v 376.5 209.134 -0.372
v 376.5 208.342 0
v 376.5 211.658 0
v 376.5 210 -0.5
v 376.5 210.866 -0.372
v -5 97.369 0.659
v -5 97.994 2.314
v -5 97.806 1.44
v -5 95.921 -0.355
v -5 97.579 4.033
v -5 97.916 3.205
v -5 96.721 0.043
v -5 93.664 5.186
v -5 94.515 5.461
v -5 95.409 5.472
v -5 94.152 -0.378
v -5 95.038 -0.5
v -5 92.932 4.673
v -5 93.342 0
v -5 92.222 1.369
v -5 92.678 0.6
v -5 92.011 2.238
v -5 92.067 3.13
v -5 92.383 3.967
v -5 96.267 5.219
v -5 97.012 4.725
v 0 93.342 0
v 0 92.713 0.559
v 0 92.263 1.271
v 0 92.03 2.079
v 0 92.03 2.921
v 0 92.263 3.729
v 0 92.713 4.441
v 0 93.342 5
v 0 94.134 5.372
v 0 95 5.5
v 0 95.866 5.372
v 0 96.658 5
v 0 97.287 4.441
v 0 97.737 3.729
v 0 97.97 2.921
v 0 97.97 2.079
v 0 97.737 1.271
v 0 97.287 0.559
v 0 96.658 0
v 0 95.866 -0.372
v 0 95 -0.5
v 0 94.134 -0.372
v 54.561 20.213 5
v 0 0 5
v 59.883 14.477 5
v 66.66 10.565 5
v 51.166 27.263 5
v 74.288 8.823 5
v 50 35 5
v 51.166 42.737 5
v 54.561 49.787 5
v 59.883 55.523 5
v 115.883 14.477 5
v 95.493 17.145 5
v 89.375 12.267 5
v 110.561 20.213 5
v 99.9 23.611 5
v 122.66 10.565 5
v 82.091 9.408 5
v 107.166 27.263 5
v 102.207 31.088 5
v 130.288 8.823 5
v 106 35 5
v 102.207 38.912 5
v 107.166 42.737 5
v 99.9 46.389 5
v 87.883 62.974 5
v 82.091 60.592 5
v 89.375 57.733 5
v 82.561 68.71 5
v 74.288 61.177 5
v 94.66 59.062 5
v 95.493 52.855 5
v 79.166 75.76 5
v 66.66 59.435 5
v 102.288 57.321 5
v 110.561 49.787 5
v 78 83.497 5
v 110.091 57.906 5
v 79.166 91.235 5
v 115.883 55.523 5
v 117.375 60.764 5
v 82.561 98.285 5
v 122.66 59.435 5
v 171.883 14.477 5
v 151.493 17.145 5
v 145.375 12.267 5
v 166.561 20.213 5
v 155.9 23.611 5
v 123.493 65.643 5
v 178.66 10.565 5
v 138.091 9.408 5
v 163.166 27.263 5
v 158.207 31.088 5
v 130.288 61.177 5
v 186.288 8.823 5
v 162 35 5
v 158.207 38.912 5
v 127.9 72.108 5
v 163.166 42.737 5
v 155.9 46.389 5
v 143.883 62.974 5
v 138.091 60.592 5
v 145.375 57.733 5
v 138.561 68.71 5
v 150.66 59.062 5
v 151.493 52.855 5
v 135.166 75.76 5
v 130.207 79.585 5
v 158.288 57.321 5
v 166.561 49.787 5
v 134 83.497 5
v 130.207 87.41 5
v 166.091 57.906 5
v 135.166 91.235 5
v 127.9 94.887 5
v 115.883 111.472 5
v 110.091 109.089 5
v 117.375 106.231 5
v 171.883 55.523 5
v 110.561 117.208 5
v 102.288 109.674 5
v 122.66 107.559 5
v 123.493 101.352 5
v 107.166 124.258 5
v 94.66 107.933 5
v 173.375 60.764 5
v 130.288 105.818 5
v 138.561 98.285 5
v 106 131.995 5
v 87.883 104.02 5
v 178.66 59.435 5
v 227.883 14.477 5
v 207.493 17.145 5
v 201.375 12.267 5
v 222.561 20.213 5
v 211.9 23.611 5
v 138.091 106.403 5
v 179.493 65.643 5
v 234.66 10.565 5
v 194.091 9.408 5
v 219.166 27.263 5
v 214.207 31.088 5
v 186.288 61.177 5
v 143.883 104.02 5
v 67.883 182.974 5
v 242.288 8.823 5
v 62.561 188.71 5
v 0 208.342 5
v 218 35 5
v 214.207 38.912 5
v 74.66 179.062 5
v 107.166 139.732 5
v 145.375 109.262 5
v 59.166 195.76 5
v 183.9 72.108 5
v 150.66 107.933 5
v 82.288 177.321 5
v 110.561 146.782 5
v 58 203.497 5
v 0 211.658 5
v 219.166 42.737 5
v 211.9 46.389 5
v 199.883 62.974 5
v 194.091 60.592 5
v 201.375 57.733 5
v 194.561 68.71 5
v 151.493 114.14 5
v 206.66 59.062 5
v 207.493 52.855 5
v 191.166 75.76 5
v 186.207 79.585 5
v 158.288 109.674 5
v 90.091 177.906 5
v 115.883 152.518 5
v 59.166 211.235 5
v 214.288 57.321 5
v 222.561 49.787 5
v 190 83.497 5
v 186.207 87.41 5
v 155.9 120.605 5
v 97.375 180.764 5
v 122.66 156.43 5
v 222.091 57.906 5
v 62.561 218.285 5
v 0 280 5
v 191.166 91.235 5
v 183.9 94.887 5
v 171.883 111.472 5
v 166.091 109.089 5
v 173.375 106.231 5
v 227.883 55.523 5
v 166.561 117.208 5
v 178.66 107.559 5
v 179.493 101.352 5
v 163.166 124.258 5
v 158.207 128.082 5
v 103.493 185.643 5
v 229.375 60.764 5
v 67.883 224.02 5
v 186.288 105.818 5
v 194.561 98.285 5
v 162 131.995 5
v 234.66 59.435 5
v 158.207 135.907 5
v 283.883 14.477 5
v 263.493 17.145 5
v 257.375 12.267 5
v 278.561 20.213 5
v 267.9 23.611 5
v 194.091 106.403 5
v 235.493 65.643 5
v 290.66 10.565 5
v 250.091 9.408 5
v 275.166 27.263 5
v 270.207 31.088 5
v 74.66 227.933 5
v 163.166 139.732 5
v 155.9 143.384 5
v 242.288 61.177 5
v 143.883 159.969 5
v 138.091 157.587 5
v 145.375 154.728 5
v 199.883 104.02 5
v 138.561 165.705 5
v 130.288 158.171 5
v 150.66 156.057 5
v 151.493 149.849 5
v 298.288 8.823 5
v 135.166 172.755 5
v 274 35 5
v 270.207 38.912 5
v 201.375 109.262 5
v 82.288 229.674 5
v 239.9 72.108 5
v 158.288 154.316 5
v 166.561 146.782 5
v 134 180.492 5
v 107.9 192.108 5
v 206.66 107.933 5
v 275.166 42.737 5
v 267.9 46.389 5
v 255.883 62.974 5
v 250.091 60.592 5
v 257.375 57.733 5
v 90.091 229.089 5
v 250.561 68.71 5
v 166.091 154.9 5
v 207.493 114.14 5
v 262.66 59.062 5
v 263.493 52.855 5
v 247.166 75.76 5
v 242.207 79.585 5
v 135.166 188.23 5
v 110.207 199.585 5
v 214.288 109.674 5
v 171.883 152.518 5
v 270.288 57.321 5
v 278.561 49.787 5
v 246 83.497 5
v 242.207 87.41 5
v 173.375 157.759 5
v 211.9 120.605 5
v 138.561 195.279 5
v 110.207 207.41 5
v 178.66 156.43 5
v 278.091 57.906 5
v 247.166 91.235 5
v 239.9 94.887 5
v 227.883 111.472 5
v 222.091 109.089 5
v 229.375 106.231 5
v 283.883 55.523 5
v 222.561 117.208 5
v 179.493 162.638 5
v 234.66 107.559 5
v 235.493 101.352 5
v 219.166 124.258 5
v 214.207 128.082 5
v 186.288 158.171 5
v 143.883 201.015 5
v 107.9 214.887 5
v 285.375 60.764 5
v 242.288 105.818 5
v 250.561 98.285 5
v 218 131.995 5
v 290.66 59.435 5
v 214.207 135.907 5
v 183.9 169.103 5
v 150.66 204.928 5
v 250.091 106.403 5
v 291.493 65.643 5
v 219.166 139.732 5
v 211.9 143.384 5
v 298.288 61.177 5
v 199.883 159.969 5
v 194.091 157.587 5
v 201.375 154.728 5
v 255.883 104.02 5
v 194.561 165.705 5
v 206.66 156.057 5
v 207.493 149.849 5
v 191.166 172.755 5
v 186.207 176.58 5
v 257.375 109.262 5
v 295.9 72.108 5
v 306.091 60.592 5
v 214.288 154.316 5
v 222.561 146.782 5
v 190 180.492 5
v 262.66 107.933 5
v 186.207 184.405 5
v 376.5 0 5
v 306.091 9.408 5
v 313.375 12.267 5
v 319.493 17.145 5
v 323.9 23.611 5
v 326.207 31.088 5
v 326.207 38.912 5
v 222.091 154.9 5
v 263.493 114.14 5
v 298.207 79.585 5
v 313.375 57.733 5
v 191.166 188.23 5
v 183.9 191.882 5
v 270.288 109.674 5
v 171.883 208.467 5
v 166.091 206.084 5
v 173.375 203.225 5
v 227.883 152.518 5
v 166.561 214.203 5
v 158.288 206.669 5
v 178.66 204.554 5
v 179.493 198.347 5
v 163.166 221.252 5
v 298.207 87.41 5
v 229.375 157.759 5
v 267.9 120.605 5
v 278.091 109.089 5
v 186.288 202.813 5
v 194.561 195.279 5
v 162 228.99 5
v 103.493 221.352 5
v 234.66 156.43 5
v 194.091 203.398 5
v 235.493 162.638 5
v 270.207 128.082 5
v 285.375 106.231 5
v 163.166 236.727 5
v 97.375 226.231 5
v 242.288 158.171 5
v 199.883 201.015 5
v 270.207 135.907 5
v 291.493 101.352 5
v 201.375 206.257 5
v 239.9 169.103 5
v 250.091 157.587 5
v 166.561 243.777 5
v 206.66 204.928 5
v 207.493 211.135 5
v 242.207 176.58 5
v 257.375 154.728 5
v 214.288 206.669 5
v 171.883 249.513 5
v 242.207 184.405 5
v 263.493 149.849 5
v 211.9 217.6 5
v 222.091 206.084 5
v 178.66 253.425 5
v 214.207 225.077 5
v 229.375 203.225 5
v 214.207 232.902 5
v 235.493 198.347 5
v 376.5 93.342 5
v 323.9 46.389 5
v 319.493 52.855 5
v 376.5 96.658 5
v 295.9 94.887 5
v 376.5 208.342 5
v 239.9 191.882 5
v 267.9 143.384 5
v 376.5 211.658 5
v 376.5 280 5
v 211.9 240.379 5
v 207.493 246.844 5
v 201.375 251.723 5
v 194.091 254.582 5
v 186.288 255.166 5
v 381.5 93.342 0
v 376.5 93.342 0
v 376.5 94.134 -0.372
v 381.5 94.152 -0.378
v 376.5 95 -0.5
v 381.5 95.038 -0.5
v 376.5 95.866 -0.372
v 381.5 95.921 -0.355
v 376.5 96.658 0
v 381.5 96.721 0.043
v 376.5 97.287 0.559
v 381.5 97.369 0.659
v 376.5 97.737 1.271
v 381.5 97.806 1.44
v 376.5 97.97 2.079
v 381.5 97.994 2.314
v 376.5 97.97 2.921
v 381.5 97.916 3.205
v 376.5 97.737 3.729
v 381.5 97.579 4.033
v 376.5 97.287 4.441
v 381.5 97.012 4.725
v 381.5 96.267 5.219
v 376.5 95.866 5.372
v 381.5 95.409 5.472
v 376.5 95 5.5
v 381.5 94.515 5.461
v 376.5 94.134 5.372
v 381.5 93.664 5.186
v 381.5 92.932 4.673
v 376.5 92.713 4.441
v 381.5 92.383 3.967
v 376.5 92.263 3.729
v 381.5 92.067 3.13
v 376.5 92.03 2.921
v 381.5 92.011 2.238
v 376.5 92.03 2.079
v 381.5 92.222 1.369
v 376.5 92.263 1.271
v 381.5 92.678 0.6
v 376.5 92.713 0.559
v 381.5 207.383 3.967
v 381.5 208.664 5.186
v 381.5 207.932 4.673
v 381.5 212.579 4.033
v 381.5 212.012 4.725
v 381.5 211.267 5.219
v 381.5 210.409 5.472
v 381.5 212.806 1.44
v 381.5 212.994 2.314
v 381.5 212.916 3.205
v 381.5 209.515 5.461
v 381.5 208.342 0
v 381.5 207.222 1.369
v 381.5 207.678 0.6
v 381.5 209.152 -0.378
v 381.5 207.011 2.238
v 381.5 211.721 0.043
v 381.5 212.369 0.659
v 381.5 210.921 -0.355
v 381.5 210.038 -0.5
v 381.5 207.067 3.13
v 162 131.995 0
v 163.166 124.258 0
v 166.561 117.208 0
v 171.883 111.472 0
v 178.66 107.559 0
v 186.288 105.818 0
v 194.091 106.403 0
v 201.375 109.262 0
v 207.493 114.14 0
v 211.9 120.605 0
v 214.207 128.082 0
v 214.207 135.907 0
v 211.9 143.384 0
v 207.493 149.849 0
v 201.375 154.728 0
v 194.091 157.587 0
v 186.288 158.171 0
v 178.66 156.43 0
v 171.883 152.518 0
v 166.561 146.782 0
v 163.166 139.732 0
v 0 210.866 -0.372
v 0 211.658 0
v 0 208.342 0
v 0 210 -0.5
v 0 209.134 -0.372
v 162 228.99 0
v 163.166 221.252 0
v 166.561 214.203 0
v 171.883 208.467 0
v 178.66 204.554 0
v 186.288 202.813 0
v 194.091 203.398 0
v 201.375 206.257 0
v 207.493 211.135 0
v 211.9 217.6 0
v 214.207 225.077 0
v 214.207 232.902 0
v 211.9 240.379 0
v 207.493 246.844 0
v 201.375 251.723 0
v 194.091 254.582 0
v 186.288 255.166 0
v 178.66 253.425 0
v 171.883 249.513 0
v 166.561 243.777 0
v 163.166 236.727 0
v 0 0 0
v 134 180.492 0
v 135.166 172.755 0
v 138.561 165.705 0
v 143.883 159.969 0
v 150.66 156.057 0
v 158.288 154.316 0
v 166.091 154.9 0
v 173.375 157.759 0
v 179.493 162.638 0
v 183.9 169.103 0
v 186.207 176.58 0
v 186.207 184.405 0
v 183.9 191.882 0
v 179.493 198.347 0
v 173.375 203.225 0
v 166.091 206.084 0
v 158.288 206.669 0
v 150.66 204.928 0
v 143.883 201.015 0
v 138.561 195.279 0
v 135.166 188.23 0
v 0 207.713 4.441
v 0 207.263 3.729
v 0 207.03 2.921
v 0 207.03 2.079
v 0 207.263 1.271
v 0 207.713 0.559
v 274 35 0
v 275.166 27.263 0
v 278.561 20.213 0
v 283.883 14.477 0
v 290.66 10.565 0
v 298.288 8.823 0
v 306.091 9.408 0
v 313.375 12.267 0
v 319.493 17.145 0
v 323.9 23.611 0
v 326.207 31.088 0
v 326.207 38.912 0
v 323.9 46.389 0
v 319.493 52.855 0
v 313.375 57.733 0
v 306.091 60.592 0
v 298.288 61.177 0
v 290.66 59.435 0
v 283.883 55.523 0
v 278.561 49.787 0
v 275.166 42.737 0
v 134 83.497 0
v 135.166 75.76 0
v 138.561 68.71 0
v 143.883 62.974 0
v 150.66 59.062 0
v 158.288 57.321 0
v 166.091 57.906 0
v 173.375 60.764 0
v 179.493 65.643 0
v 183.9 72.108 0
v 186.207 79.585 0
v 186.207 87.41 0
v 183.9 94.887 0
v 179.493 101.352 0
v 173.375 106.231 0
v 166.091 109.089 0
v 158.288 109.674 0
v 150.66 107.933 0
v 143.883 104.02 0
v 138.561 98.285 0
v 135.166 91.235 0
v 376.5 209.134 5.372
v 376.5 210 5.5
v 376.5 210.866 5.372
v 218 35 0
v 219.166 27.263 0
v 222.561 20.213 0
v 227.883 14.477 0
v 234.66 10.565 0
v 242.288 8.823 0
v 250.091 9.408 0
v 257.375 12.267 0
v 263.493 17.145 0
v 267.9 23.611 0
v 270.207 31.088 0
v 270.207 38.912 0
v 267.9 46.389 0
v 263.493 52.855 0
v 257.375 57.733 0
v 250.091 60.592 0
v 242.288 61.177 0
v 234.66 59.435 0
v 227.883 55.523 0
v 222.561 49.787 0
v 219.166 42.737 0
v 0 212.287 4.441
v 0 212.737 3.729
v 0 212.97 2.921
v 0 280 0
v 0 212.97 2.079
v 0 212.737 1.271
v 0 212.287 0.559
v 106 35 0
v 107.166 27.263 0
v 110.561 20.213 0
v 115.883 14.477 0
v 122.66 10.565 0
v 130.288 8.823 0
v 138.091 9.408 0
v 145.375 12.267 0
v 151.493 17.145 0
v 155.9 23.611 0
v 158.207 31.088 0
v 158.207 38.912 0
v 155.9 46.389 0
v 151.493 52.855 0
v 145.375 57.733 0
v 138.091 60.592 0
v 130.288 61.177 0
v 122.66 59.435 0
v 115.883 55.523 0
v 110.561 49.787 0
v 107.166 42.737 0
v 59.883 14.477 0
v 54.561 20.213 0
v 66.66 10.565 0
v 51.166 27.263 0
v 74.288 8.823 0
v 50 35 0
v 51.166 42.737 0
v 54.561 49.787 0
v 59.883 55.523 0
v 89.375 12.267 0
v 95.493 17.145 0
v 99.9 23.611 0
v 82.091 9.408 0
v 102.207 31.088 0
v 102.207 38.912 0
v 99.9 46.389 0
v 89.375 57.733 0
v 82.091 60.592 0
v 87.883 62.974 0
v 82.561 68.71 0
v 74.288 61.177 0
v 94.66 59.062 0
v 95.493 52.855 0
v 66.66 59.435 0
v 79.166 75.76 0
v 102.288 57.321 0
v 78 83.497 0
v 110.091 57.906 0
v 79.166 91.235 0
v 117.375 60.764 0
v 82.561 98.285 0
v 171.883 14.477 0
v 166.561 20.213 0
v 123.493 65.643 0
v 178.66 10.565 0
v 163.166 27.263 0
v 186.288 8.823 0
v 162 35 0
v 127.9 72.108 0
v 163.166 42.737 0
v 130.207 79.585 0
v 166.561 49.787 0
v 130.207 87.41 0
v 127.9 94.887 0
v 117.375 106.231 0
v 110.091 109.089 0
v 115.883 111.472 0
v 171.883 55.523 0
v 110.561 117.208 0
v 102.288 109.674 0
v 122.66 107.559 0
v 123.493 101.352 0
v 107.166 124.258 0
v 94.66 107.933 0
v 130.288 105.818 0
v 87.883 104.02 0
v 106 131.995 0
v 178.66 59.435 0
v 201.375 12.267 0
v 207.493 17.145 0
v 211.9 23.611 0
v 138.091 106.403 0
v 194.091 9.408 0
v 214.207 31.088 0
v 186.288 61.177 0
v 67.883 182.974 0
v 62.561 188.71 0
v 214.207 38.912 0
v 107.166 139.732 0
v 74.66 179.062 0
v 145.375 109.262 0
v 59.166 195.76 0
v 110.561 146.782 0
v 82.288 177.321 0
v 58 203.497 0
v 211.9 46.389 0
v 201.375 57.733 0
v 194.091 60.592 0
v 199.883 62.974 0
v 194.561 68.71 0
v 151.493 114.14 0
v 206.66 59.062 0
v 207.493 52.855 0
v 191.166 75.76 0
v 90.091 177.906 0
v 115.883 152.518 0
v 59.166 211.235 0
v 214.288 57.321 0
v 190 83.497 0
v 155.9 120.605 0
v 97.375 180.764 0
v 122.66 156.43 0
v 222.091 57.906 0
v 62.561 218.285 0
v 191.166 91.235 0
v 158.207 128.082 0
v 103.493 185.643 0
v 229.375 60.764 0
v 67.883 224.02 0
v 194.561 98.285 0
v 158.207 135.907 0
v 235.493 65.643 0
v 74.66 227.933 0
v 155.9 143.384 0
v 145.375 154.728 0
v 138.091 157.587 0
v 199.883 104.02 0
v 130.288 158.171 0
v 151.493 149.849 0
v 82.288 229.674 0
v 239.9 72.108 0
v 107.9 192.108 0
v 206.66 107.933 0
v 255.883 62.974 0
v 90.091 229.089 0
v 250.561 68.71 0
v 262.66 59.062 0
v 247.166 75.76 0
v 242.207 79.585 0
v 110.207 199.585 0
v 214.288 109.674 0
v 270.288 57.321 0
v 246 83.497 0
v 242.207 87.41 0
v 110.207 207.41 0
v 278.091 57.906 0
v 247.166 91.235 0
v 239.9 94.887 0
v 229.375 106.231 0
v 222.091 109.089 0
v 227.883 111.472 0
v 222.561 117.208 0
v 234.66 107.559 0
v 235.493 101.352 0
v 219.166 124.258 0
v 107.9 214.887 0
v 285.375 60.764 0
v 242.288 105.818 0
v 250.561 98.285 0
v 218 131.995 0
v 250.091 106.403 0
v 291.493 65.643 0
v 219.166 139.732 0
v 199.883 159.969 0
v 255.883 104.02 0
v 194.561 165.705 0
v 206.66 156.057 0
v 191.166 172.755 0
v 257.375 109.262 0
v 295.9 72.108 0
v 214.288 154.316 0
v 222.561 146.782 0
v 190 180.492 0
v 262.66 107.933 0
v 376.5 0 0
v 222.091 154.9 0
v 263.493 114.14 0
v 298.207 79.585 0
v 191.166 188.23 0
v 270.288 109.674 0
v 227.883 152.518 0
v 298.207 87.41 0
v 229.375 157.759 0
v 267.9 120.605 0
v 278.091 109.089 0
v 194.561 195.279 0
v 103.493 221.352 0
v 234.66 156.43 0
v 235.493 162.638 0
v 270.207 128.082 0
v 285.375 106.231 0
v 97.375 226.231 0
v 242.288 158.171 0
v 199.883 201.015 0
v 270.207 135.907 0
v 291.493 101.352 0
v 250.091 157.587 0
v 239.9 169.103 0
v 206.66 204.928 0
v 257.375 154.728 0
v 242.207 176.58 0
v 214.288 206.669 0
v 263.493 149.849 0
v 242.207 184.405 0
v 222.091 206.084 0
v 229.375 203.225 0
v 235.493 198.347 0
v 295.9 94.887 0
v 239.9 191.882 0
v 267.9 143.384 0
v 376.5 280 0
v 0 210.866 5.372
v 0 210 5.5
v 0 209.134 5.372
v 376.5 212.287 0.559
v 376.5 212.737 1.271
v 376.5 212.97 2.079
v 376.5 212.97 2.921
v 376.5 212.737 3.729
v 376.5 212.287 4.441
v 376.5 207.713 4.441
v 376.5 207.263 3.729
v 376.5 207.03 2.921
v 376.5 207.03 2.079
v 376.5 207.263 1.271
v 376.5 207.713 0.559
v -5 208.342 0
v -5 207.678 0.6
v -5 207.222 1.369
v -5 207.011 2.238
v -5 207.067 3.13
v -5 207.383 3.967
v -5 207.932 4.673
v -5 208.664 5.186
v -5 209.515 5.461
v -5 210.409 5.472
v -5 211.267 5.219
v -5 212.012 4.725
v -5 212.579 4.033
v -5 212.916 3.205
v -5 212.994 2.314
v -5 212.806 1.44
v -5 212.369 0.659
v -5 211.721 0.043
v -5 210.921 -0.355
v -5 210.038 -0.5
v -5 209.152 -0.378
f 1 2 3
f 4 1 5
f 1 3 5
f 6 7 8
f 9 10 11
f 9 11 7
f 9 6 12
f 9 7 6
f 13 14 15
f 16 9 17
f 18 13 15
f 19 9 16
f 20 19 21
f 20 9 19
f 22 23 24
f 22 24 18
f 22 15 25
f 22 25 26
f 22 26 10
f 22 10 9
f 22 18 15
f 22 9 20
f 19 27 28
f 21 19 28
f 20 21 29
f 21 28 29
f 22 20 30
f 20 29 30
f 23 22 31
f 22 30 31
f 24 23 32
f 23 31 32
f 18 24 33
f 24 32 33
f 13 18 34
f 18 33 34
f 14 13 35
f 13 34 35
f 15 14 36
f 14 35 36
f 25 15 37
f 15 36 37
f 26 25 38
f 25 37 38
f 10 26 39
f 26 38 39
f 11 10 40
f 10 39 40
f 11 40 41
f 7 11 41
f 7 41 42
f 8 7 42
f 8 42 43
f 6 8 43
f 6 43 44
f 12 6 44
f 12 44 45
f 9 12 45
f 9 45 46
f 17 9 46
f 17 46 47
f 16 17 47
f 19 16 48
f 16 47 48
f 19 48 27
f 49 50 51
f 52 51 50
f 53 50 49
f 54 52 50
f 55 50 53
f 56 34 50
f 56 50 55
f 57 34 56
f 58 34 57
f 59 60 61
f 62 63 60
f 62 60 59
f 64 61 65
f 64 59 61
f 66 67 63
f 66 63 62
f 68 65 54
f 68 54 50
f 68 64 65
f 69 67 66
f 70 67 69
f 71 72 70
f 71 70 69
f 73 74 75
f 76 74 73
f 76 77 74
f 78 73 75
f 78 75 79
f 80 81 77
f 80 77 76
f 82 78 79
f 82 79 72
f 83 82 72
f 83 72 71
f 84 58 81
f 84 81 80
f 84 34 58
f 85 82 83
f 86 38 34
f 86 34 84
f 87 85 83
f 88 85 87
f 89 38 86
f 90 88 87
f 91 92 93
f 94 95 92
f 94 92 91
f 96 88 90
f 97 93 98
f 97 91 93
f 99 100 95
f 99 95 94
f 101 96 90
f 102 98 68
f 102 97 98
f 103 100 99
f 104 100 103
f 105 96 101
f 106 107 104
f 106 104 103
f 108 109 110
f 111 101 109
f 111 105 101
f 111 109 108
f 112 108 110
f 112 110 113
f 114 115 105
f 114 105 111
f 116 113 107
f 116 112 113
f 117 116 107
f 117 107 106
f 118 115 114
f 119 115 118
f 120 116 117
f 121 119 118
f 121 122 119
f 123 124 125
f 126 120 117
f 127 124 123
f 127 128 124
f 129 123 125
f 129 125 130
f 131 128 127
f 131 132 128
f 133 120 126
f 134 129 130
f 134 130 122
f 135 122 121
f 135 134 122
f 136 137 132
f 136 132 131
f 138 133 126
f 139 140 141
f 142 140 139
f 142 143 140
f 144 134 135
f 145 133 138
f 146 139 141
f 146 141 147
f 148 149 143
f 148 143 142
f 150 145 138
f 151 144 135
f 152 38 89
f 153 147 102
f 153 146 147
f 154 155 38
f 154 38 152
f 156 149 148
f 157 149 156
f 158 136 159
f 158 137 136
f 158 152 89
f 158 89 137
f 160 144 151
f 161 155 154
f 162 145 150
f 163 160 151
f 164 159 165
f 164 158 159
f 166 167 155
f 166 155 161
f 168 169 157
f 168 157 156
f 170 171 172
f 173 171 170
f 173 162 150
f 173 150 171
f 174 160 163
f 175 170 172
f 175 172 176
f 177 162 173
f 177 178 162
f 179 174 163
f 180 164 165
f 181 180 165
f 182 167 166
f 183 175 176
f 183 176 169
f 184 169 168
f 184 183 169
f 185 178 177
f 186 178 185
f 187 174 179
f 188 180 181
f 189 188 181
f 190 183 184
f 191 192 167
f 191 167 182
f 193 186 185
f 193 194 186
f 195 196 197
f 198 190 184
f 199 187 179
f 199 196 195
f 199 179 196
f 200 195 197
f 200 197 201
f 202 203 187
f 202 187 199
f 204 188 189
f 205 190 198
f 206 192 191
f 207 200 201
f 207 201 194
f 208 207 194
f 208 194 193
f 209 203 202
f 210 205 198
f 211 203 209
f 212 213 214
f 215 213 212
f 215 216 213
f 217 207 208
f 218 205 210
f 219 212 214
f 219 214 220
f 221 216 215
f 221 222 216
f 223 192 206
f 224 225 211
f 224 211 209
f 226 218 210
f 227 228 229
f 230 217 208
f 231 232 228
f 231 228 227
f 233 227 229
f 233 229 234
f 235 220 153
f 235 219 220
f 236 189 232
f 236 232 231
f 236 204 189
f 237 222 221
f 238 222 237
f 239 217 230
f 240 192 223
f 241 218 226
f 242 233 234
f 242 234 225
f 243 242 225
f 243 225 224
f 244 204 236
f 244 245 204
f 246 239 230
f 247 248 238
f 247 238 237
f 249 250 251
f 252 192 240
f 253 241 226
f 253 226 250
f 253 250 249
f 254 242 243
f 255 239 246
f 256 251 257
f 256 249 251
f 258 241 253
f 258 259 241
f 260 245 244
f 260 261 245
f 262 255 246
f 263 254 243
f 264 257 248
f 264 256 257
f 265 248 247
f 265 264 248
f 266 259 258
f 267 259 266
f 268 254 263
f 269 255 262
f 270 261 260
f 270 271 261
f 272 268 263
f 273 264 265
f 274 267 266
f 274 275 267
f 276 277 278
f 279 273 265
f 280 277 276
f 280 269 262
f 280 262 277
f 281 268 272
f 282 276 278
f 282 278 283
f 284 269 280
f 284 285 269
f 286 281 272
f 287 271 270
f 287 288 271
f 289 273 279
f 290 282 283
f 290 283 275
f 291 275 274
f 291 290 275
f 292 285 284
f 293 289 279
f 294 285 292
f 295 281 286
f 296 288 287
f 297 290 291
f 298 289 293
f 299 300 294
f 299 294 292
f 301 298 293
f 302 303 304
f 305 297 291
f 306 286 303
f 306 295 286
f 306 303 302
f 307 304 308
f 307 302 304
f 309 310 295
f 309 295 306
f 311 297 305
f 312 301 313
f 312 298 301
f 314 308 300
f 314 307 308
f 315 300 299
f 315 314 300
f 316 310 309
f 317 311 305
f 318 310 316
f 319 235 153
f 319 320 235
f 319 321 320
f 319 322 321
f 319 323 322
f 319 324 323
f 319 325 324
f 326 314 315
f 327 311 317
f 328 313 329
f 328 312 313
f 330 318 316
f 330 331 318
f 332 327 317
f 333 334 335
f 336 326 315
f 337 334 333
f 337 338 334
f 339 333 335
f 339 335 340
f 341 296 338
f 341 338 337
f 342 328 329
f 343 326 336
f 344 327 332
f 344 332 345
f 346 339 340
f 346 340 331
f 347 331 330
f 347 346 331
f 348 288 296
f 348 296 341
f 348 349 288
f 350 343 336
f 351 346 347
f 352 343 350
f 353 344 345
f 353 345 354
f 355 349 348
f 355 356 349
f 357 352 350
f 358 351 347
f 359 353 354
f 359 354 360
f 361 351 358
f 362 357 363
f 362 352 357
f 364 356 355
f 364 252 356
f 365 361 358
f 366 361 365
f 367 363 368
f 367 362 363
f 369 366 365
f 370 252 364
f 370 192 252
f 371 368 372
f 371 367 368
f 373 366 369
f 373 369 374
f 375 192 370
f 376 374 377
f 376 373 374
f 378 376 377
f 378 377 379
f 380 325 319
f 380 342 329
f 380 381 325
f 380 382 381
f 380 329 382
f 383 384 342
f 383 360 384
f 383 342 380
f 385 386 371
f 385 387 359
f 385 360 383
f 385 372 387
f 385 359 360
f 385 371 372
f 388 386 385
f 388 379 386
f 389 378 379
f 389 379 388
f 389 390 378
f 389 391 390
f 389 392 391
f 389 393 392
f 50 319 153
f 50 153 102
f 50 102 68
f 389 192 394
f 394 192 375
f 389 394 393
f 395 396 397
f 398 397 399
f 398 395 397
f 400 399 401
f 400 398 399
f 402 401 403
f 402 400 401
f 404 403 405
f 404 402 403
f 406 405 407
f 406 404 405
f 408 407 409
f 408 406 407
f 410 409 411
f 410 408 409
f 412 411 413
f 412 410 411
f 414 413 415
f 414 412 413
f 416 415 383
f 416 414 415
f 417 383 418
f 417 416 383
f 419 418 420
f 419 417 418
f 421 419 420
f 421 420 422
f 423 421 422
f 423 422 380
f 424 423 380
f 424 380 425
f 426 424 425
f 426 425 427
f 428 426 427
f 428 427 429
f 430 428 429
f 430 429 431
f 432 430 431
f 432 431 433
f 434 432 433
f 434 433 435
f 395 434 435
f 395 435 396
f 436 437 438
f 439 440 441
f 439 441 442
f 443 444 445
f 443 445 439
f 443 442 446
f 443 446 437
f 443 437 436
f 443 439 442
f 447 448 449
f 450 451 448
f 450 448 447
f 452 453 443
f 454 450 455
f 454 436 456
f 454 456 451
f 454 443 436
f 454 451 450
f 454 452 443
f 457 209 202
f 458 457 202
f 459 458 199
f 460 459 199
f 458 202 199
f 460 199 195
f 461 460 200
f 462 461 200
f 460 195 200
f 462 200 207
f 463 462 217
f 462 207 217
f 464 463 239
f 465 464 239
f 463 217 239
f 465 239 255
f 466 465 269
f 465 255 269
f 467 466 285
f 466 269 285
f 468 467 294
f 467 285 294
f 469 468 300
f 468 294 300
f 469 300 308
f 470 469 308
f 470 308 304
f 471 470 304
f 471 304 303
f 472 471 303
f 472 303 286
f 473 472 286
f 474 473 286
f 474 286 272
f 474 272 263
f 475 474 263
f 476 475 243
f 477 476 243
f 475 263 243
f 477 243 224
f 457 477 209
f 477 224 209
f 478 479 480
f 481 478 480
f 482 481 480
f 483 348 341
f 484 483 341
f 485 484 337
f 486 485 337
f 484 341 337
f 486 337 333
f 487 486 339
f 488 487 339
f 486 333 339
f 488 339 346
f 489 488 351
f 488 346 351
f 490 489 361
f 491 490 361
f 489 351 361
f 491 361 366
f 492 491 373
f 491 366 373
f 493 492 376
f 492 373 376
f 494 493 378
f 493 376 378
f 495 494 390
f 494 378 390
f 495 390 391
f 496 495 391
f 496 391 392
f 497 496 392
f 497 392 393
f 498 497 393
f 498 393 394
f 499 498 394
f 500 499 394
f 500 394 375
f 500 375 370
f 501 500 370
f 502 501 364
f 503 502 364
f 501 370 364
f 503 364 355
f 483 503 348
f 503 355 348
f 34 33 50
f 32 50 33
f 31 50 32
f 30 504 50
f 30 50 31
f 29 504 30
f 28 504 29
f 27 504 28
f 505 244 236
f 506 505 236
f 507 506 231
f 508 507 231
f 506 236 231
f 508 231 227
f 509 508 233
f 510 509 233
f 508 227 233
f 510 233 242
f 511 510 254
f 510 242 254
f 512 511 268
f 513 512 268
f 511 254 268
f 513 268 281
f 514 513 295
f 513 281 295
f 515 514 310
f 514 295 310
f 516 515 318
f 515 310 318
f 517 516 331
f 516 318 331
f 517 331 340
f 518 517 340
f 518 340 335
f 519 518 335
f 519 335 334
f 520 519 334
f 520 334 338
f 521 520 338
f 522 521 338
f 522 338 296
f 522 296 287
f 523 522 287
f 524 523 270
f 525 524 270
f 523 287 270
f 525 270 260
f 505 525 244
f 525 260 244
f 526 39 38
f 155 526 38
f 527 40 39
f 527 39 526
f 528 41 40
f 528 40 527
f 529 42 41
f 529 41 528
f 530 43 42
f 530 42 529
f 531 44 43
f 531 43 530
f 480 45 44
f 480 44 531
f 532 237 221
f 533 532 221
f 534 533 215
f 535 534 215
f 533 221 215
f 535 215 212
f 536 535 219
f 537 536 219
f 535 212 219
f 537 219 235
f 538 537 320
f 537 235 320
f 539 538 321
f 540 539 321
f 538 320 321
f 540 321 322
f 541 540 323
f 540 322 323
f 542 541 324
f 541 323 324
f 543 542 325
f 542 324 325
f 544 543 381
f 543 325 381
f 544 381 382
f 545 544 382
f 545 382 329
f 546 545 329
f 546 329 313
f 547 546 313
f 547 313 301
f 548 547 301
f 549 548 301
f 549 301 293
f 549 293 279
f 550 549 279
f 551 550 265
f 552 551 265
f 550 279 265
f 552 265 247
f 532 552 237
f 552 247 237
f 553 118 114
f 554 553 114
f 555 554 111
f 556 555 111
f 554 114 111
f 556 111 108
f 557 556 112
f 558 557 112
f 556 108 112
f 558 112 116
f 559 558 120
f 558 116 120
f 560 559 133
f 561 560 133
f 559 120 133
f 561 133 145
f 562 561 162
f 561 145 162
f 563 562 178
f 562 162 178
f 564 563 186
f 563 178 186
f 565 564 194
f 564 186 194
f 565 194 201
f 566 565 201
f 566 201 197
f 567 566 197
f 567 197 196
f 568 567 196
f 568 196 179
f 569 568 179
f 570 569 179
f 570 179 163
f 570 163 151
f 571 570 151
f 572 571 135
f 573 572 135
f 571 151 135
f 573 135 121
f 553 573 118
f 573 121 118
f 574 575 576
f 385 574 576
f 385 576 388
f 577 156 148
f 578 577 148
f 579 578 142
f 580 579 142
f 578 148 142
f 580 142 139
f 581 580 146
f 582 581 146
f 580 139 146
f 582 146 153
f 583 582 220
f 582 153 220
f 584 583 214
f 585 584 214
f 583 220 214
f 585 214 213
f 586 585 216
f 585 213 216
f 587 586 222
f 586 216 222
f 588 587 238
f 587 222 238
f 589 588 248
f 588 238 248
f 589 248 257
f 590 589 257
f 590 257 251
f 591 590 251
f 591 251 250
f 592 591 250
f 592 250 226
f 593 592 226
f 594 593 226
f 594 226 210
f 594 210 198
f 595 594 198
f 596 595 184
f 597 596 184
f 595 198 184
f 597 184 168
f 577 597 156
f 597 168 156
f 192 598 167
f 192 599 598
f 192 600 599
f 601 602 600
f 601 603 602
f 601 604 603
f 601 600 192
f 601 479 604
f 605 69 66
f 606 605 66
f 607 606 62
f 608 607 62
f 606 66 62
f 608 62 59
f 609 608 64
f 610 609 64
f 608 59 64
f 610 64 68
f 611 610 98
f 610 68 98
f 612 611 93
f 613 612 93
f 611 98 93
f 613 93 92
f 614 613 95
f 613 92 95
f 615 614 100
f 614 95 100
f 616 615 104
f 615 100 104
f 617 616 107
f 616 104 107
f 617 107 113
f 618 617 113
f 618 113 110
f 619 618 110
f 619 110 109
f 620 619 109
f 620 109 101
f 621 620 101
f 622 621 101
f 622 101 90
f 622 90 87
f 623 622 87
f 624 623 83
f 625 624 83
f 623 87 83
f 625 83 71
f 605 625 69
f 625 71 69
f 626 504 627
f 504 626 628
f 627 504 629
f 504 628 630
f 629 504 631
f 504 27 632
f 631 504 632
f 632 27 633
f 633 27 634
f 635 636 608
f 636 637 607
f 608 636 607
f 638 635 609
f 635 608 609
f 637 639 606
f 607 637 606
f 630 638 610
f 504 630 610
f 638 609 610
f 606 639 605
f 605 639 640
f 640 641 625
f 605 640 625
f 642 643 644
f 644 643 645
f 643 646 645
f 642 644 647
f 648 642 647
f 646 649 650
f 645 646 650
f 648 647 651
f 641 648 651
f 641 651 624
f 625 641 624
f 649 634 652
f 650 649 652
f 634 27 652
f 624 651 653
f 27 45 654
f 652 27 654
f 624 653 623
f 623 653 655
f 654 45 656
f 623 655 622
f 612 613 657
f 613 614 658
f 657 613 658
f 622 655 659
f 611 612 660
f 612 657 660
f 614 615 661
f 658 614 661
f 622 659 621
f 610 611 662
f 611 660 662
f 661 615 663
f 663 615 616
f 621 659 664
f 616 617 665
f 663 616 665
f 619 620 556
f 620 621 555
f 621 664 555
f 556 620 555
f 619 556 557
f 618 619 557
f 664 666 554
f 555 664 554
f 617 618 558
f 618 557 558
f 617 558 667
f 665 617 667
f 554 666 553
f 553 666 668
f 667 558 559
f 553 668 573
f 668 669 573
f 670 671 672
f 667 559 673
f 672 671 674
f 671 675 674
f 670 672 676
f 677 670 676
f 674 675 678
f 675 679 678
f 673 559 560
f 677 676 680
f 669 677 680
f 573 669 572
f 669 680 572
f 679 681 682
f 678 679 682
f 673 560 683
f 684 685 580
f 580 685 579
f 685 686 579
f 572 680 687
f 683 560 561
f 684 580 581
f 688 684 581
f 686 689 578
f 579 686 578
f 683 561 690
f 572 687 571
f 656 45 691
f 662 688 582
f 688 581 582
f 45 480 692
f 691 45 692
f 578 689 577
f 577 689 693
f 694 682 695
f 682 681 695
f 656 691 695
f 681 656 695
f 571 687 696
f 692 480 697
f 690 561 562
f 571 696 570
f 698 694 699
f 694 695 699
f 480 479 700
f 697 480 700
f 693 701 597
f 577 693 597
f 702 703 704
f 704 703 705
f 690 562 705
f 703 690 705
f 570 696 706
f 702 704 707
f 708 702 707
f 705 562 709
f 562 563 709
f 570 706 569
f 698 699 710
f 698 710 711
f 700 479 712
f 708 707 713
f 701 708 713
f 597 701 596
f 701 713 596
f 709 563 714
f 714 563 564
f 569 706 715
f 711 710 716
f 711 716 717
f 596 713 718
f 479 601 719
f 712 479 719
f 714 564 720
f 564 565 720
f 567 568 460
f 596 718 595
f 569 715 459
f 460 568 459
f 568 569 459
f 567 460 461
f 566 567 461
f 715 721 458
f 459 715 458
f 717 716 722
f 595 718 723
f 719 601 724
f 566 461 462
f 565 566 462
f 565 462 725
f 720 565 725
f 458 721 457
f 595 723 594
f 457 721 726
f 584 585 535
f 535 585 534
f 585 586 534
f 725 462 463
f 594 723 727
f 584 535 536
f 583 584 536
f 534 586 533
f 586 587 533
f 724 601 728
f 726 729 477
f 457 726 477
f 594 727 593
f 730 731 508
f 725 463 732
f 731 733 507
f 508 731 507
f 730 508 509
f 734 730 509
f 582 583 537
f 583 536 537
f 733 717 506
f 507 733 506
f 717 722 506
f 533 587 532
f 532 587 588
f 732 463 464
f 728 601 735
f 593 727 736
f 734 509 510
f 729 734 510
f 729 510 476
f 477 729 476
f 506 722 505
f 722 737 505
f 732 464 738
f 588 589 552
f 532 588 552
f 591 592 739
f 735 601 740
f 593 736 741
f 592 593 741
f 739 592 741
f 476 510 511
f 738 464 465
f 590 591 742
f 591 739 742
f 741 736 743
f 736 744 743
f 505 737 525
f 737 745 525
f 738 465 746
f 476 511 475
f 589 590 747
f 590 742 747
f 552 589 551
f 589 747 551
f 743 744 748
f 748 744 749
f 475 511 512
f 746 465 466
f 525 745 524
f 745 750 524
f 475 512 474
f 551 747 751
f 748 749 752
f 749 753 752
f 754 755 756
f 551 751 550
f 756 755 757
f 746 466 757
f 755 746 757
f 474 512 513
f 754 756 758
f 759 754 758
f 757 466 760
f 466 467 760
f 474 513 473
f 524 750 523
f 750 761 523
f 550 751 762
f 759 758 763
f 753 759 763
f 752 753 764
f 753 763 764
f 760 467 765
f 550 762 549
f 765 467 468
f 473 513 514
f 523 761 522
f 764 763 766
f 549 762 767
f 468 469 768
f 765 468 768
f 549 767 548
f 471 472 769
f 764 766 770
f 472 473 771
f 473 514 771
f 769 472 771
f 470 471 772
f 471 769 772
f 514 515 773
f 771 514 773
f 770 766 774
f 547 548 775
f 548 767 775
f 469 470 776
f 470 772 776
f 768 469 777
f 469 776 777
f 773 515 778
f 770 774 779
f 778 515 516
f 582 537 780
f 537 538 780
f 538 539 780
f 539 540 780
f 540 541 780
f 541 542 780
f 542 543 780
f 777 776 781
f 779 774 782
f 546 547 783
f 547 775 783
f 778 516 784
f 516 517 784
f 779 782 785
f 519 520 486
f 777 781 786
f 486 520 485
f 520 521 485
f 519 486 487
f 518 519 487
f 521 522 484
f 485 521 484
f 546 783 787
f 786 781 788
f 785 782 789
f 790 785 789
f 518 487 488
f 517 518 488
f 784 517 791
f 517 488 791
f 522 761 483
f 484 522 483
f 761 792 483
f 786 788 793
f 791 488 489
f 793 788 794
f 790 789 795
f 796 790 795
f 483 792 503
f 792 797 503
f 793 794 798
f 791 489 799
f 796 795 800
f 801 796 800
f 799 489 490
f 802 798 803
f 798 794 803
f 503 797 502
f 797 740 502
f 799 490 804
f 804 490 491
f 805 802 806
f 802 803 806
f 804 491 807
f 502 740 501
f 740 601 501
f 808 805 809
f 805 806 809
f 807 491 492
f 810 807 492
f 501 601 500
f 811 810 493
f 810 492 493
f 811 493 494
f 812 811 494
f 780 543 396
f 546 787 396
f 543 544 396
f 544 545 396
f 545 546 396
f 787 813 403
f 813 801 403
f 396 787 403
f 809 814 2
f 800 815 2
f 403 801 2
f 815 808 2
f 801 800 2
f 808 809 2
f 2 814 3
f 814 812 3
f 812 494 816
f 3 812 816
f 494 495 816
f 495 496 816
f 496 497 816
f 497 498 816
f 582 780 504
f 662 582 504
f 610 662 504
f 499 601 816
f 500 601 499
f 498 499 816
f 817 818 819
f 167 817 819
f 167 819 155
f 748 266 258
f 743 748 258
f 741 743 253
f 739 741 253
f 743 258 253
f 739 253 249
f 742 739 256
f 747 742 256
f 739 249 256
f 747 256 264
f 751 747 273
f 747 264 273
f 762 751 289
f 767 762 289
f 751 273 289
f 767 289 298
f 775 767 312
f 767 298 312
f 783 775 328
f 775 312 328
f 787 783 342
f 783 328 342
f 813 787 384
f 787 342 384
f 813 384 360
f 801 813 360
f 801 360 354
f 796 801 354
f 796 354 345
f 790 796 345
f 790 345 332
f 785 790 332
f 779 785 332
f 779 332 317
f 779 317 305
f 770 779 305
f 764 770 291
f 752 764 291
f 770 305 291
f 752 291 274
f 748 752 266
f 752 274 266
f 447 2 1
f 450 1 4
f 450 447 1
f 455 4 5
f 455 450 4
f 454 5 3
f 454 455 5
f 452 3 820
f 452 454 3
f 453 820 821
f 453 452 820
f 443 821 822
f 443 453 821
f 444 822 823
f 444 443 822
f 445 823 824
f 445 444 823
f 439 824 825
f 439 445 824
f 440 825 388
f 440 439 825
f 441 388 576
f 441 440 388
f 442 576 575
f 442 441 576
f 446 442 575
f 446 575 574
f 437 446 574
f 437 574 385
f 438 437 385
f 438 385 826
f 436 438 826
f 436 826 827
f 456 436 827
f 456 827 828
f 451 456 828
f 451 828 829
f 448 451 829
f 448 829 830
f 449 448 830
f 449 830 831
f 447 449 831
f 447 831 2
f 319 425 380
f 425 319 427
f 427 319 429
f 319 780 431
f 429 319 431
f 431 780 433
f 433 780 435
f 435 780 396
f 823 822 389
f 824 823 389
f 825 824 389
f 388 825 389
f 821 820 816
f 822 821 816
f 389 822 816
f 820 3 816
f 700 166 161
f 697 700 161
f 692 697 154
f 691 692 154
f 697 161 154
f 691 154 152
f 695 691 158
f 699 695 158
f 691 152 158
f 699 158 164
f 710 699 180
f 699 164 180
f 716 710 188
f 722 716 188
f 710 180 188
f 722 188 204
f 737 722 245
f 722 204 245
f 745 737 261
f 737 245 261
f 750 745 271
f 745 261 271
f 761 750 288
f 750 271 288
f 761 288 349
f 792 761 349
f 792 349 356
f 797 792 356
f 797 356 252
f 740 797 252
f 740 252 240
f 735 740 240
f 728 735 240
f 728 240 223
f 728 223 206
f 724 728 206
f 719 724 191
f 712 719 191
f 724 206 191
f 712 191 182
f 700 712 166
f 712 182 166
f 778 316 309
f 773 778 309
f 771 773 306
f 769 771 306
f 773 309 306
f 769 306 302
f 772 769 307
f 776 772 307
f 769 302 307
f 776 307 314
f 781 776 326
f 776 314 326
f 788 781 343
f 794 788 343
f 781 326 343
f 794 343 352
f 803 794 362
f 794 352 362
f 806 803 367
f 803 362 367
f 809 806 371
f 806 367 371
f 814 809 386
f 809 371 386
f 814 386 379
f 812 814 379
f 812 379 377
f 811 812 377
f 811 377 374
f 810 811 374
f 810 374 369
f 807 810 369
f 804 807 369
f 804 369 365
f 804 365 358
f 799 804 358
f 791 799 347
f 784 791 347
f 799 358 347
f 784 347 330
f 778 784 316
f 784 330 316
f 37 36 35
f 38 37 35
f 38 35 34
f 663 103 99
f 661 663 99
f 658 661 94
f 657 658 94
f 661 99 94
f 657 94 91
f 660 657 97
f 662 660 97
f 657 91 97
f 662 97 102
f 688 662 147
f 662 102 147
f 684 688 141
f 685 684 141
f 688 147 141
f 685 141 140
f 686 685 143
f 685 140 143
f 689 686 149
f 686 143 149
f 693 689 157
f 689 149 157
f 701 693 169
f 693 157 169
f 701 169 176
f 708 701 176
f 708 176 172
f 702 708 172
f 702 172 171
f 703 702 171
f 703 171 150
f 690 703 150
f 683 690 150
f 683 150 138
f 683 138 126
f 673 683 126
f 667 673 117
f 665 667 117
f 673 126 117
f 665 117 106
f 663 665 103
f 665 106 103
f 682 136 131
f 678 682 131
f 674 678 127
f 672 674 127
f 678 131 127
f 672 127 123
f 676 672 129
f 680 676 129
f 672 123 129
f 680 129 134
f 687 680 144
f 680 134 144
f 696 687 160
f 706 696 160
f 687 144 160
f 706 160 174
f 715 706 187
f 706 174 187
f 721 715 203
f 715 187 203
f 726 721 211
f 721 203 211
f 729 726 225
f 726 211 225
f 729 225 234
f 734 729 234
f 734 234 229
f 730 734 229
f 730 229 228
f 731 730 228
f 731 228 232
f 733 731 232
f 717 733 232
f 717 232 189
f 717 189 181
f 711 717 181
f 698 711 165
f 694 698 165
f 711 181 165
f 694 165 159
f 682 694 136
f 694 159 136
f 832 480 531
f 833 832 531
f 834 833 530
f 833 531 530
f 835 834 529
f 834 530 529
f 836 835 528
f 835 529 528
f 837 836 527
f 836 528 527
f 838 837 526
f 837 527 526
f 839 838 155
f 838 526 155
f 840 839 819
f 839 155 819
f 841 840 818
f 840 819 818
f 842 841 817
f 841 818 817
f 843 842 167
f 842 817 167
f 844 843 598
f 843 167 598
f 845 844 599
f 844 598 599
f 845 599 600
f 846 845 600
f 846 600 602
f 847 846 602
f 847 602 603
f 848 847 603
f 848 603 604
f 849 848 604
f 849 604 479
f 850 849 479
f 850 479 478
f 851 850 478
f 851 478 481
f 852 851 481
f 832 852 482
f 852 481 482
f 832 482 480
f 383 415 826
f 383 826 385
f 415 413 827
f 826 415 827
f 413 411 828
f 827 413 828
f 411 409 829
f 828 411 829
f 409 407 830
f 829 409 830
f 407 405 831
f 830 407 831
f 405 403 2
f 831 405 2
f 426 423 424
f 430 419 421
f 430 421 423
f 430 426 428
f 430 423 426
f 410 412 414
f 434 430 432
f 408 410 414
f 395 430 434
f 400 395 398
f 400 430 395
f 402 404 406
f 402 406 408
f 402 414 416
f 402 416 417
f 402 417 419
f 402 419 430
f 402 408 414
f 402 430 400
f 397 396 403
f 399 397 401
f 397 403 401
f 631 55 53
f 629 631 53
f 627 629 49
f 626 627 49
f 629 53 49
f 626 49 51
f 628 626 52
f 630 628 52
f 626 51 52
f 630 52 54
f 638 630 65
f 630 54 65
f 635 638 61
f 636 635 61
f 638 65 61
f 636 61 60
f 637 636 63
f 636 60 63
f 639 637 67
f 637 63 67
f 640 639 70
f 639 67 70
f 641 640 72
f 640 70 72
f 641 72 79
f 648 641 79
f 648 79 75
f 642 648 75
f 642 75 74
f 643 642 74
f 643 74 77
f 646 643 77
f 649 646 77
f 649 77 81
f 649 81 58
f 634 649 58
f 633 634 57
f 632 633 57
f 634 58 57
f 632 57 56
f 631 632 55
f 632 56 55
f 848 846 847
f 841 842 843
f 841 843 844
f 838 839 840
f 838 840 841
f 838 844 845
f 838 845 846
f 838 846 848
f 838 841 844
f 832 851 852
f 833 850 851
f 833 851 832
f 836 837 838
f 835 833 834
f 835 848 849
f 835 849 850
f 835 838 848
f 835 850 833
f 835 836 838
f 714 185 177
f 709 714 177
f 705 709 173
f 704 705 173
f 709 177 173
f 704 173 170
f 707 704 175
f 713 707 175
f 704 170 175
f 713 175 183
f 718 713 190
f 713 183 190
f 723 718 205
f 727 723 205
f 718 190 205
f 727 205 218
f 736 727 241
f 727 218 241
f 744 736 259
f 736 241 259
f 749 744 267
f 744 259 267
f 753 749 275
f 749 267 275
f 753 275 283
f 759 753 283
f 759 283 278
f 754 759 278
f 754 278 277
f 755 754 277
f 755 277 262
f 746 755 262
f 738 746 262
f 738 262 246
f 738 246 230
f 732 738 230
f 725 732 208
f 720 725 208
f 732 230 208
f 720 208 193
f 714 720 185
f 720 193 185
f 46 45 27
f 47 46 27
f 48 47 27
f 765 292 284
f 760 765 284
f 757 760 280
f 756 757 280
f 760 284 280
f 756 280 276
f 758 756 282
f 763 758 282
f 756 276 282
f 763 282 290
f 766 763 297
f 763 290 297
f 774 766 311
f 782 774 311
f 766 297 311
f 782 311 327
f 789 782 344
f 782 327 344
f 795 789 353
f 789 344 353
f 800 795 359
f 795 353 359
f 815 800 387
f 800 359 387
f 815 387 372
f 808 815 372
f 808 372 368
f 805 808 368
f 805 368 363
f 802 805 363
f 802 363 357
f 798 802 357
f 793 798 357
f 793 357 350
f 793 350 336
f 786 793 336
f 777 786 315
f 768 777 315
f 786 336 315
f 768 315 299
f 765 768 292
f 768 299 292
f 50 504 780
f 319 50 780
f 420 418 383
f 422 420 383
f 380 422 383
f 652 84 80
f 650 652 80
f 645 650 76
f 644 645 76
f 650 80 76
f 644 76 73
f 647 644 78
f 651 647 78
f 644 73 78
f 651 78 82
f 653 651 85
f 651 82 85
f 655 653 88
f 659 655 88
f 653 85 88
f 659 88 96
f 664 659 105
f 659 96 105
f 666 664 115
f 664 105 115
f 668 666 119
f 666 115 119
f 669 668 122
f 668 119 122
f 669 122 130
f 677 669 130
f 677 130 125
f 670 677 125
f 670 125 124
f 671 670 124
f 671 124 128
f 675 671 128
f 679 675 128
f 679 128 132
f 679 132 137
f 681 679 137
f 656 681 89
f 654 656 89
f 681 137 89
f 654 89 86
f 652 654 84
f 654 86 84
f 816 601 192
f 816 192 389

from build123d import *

# Parameters (mm, degrees)
SKETCH_1_W          = 376.5
SKETCH_1_H          = 280
EXTRUDE_1_DEPTH     = 5
SKETCH_2_R          = 26.25
CUT_EXTRUDE_1_DEPTH = 5
SKETCH_3_R          = 3
EXTRUDE_2_DEPTH     = 5
EXTRUDE_START       = 5
SKETCH_4_R          = 3
EXTRUDE_3_DEPTH     = 5


with BuildPart() as part:
    # 草图1 → 凸台-拉伸1 (new body)
    with BuildSketch(Plane.XY):
        with Locations((188.25, 140)):
            Rectangle(SKETCH_1_W, SKETCH_1_H)
    extrude(amount=EXTRUDE_1_DEPTH)

    # 草图2 → 切除-拉伸1 (cut)
    with BuildSketch(Plane.XY.offset(5)):
        with Locations(Location((84.25, 203.497422612, 0), (0, 0, 180))):
            Circle(SKETCH_2_R)
        with Locations(Location((188.25, 228.989690448, 0), (0, 0, 180))):
            Circle(SKETCH_2_R)
        with Locations(Location((160.25, 180.492267836, 0), (0, 0, 180))):
            Circle(SKETCH_2_R)
        with Locations(Location((216.25, 180.492267836, 0), (0, 0, 180))):
            Circle(SKETCH_2_R)
        with Locations(Location((244.25, 131.994845224, 0), (0, 0, 180))):
            Circle(SKETCH_2_R)
        with Locations(Location((132.25, 131.994845224, 0), (0, 0, 180))):
            Circle(SKETCH_2_R)
        with Locations(Location((188.25, 131.994845224, 0), (0, 0, 180))):
            Circle(SKETCH_2_R)
        with Locations(Location((272.25, 83.497422612, 0), (0, 0, 180))):
            Circle(SKETCH_2_R)
        with Locations(Location((216.25, 83.497422612, 0), (0, 0, 180))):
            Circle(SKETCH_2_R)
        with Locations(Location((104.25, 83.497422612, 0), (0, 0, 180))):
            Circle(SKETCH_2_R)
        with Locations(Location((160.25, 83.497422612, 0), (0, 0, 180))):
            Circle(SKETCH_2_R)
        with Locations(Location((300.25, 35, 0), (0, 0, 180))):
            Circle(SKETCH_2_R)
        with Locations(Location((244.25, 35, 0), (0, 0, 180))):
            Circle(SKETCH_2_R)
        with Locations(Location((188.25, 35, 0), (0, 0, 180))):
            Circle(SKETCH_2_R)
        with Locations(Location((132.25, 35, 0), (0, 0, 180))):
            Circle(SKETCH_2_R)
        with Locations(Location((76.25, 35, 0), (0, 0, 180))):
            Circle(SKETCH_2_R)
    extrude(amount=-CUT_EXTRUDE_1_DEPTH, mode=Mode.SUBTRACT)

    # 草图3 → 凸台-拉伸2 (add)
    with BuildSketch(Plane.ZY):
        with Locations(Location((2.5, 210, 0), (0, 0, 213.557309762))):
            Circle(SKETCH_3_R)
        with Locations(Location((2.5, 95, 0), (0, 0, 213.557309762))):
            Circle(SKETCH_3_R)
    extrude(amount=EXTRUDE_2_DEPTH)

    # 草图4 → 凸台-拉伸3 (add)
    with BuildSketch(Plane(origin=(376.5, 0, 0), x_dir=(0, 0, -1), z_dir=(1, 0, 0)).offset(EXTRUDE_START)):
        with Locations(Location((-2.5, 210, 0), (0, 0, 326.442690238))):
            Circle(SKETCH_4_R)
        with Locations(Location((-2.5, 95, 0), (0, 0, 326.442690238))):
            Circle(SKETCH_4_R)
    extrude(amount=-EXTRUDE_3_DEPTH)


solid = part.part
